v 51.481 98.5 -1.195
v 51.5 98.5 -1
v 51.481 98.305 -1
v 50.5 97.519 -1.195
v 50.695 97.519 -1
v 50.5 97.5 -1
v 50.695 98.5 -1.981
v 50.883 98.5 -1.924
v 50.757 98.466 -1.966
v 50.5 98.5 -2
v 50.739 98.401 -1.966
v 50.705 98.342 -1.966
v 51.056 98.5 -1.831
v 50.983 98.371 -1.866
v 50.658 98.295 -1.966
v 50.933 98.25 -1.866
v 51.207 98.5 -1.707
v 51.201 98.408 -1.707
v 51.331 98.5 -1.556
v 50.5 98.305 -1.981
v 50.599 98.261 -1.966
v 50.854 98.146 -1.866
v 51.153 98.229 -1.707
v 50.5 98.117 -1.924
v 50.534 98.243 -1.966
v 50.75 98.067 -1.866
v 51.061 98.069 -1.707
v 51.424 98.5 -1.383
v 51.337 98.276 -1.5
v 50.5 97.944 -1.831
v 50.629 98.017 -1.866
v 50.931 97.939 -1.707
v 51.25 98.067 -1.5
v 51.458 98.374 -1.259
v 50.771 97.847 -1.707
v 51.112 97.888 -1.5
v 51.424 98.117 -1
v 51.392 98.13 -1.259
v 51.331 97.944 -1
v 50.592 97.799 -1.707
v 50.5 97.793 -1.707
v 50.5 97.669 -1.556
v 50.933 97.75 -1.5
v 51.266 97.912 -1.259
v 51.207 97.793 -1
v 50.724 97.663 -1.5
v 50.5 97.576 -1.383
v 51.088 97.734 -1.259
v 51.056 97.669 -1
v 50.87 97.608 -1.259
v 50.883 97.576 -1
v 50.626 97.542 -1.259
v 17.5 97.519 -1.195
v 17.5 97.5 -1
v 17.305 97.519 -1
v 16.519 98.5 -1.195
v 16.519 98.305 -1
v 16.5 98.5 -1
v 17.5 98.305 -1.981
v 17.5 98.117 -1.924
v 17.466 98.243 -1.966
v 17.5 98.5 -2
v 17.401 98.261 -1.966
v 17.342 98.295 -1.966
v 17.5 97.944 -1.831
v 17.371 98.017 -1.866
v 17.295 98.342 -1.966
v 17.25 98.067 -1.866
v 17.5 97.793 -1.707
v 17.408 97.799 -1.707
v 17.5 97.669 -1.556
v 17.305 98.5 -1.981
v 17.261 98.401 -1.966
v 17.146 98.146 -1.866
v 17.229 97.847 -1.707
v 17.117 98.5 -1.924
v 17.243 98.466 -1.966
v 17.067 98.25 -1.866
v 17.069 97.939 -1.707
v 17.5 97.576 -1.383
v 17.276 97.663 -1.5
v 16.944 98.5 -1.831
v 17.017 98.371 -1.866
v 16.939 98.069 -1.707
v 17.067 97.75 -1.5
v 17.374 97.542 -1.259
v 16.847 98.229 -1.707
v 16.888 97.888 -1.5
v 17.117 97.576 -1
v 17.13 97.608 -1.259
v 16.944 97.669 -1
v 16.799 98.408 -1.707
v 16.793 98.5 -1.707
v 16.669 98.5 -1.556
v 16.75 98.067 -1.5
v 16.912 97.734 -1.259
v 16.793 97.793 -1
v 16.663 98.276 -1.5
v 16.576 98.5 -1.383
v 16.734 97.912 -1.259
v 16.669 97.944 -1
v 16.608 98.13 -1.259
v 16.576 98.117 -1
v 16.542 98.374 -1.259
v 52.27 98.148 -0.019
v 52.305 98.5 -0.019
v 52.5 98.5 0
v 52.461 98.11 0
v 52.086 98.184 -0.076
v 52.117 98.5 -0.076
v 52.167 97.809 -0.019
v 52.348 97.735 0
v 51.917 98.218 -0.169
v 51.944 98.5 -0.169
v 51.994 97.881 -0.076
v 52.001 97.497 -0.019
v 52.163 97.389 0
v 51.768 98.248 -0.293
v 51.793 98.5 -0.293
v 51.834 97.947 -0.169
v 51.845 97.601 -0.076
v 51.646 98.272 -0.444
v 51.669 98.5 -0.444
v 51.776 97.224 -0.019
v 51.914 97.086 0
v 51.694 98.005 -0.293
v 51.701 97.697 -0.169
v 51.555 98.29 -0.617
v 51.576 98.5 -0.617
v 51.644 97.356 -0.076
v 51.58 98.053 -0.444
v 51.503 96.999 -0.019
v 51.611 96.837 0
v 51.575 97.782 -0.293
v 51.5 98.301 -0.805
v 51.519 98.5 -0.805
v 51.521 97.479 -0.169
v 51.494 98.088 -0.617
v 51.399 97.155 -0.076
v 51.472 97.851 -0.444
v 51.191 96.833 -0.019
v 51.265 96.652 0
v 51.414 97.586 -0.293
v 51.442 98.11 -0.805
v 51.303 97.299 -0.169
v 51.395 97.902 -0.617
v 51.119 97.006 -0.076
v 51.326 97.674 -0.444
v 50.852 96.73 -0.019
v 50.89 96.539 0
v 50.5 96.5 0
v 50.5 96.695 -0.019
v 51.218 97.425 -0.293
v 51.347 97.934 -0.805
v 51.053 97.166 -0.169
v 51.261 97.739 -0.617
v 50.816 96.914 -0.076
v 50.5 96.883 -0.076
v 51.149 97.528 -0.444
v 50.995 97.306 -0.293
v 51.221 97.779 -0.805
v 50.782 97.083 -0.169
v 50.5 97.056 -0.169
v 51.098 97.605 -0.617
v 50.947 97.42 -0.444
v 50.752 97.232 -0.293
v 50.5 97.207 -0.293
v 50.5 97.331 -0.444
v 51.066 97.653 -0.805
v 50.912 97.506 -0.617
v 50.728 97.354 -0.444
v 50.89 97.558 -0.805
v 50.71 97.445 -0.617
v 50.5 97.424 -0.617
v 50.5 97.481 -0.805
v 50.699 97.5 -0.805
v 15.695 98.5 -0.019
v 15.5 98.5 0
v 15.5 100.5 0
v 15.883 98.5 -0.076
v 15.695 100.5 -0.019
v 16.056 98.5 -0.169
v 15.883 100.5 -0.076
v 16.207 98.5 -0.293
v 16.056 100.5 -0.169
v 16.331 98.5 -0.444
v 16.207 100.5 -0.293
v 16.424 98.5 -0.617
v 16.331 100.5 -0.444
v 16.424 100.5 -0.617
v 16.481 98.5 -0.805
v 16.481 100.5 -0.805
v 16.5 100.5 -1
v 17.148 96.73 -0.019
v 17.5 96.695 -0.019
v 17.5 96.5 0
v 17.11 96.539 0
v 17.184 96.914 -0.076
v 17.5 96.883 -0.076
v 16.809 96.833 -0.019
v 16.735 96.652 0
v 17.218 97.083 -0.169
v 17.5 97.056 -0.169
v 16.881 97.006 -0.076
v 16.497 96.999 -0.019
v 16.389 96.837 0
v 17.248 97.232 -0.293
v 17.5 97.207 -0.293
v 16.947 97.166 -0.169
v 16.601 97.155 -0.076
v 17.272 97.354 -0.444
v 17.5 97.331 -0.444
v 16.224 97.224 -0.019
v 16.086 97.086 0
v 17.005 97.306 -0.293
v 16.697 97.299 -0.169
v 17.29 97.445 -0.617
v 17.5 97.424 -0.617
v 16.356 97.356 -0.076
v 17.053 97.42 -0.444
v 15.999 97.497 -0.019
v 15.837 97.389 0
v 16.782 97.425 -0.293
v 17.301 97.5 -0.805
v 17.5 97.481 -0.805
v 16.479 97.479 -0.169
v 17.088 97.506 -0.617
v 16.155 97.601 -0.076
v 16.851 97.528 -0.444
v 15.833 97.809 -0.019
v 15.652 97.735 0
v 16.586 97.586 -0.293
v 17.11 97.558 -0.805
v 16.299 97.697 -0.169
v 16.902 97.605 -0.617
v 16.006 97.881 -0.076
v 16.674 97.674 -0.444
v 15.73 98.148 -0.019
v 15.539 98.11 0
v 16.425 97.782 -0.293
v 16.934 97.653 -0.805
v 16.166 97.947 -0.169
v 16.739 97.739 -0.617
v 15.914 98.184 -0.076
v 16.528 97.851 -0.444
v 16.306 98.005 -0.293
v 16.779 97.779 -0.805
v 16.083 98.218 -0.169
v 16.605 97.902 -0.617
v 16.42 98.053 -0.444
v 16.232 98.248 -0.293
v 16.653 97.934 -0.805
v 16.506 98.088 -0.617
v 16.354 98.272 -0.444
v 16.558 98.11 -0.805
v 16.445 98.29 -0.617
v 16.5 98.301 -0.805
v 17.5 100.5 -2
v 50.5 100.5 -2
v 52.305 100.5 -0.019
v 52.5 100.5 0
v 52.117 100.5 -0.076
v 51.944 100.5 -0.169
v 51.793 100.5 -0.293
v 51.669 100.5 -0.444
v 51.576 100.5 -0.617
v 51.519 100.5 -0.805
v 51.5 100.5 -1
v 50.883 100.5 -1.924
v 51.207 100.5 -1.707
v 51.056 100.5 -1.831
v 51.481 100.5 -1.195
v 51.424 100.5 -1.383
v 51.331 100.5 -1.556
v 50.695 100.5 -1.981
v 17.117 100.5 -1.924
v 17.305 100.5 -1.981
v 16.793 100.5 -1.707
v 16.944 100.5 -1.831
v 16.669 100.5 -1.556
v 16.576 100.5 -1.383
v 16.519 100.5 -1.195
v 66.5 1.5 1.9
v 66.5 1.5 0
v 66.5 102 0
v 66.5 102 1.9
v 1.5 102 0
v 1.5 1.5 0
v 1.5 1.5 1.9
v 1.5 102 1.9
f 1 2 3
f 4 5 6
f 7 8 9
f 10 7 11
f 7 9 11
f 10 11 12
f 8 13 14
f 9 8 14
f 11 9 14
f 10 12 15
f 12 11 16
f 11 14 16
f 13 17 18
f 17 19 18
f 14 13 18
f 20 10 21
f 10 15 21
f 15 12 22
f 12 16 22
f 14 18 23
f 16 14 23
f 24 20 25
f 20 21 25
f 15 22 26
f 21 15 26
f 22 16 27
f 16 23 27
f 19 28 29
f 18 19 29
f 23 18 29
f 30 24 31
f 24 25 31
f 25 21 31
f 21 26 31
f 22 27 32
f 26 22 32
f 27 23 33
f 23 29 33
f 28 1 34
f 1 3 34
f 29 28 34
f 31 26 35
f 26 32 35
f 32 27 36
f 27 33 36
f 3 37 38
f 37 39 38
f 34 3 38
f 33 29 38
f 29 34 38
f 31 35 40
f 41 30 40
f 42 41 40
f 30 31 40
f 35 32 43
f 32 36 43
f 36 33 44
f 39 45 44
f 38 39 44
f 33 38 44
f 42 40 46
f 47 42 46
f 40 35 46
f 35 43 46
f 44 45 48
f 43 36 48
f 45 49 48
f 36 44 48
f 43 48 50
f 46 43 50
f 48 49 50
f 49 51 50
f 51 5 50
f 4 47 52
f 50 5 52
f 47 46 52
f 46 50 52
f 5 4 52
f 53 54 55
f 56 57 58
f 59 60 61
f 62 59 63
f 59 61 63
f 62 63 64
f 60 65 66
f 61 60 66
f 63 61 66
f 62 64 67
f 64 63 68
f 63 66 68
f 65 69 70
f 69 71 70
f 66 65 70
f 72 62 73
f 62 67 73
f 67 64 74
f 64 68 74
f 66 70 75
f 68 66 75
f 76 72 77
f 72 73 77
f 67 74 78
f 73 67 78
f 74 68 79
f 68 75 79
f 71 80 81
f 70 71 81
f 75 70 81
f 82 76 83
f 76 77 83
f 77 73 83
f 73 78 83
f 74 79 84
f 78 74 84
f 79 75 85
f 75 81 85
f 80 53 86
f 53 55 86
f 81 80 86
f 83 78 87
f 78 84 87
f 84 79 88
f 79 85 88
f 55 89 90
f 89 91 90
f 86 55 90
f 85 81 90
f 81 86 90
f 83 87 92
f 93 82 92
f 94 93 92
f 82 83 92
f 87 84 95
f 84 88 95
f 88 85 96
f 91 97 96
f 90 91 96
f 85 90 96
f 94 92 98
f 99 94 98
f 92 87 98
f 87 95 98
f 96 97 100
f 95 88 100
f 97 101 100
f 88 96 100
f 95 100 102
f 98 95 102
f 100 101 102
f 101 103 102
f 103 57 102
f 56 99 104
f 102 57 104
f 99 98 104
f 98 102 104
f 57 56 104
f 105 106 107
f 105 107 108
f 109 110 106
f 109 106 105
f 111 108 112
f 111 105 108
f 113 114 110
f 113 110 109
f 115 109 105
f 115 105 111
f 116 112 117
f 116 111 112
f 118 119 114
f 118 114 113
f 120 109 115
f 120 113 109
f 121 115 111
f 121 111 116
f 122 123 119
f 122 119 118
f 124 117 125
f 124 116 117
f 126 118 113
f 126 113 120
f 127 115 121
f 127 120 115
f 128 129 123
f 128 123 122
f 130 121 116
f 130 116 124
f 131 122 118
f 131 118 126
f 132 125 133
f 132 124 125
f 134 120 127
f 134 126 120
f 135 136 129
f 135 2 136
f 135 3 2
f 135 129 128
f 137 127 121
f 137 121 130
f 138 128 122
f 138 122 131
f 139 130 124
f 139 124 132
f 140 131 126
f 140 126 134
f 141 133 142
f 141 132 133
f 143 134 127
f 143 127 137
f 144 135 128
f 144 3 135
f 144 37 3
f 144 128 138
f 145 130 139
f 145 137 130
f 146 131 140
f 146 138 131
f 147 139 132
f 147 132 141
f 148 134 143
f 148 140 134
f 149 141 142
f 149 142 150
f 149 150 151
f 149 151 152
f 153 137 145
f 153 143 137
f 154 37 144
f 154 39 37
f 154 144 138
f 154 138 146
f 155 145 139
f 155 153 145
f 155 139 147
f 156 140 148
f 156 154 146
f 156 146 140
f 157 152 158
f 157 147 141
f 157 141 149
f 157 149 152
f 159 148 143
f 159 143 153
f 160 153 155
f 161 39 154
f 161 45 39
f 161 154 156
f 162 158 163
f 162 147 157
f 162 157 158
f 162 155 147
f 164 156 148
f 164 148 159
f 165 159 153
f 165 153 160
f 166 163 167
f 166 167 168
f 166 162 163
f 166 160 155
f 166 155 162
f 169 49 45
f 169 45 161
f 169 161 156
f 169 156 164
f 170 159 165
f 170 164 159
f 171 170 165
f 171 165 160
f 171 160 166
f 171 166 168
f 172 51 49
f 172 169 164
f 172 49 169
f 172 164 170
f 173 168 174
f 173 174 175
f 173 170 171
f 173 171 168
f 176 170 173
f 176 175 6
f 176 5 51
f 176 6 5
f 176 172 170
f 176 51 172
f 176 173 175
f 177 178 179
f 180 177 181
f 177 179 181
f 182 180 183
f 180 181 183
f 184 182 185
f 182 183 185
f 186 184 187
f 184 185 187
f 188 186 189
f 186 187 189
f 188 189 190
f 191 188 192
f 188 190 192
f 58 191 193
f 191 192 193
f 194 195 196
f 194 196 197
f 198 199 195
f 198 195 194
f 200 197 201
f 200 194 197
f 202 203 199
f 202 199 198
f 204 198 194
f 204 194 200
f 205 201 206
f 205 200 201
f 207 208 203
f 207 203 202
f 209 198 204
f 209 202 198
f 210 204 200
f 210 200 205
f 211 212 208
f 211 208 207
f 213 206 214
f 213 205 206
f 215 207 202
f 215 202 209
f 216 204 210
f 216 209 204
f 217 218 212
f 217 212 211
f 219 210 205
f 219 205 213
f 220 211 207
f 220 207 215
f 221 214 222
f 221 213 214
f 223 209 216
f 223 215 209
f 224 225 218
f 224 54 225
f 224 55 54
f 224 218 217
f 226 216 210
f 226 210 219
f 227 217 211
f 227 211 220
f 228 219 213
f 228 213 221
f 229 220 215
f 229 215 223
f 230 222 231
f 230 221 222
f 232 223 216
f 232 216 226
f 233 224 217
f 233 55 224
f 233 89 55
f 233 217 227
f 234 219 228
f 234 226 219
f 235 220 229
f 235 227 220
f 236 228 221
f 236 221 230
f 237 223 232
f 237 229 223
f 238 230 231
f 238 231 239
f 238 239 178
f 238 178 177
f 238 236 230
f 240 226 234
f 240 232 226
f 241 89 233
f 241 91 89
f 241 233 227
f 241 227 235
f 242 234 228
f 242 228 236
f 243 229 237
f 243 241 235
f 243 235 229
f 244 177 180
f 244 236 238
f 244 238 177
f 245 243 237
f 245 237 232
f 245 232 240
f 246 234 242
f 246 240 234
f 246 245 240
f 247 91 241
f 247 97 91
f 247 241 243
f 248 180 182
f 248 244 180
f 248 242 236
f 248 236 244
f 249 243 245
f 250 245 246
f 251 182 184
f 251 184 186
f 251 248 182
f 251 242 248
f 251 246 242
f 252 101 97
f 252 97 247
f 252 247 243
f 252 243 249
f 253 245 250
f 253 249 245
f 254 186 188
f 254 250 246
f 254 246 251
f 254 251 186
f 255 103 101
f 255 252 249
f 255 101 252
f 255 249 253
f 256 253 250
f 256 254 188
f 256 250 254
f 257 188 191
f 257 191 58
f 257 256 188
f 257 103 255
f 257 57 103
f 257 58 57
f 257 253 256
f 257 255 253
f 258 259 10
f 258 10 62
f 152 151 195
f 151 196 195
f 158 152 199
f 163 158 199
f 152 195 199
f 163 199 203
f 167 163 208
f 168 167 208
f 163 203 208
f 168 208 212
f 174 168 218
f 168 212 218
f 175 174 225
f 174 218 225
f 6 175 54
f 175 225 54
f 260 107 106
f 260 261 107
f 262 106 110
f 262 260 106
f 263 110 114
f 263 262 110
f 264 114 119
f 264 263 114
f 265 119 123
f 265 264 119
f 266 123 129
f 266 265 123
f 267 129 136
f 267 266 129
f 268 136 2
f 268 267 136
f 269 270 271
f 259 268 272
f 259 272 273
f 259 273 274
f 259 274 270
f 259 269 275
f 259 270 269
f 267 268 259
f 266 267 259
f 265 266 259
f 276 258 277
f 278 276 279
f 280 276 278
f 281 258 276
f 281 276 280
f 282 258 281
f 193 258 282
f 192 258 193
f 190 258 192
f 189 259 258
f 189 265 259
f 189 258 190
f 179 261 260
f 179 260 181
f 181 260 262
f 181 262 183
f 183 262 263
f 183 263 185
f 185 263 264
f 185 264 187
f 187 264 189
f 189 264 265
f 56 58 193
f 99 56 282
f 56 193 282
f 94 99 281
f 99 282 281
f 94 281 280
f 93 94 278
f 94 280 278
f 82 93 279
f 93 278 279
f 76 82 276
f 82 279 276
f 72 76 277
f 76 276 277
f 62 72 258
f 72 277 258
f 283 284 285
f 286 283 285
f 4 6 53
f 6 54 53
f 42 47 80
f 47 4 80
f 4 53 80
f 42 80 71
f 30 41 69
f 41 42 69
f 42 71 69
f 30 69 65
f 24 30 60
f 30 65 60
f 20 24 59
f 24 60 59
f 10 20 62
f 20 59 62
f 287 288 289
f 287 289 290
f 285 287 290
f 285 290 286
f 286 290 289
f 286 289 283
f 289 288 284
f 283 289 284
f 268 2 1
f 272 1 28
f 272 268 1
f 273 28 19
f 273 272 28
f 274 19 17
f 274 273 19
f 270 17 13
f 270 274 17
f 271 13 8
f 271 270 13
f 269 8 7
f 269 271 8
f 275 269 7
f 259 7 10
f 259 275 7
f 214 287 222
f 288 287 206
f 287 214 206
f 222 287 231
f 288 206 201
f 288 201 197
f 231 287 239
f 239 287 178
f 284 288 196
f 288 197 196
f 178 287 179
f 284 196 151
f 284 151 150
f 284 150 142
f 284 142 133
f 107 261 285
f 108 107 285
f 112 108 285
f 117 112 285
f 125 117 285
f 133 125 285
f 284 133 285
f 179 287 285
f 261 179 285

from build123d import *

# Parameters (mm, degrees)
SKETCH1_W           = 65
SKETCH1_H           = 100.5
BOSS_EXTRUDE1_DEPTH = 1.9
SKETCH2_W           = 35
SKETCH2_H           = 3
BOSS_EXTRUDE2_DEPTH = 2
FILLET2_R           = 1


with BuildPart() as part:
    # Sketch1 → Boss-Extrude1 (new body)
    with BuildSketch(Plane.XY):
        with Locations((34, 51.75)):
            Rectangle(SKETCH1_W, SKETCH1_H)
    extrude(amount=BOSS_EXTRUDE1_DEPTH)

    # Sketch2 → Boss-Extrude2 (add)
    with BuildSketch(Plane(origin=(0, 0, 0), x_dir=(-1, 0, 0), z_dir=(0, 0, -1))):
        with Locations((-34, 99)):
            Rectangle(SKETCH2_W, SKETCH2_H)
    extrude(amount=BOSS_EXTRUDE2_DEPTH)

    # Fillet2
    fillet2_edges = [part.edges().sort_by_distance(p)[0] for p in [
        (51.5, 99, 0),
        (34, 97.5, 0),
        (51.5, 97.5, -1),
        (16.5, 99, 0),
        (16.5, 97.5, -1),
        (51.5, 99, -2),
        (34, 97.5, -2),
        (16.5, 99, -2),
    ]]
    fillet(fillet2_edges, radius=FILLET2_R - 0.0001)  # a hair under: the kernel refuses the full size


solid = part.part
